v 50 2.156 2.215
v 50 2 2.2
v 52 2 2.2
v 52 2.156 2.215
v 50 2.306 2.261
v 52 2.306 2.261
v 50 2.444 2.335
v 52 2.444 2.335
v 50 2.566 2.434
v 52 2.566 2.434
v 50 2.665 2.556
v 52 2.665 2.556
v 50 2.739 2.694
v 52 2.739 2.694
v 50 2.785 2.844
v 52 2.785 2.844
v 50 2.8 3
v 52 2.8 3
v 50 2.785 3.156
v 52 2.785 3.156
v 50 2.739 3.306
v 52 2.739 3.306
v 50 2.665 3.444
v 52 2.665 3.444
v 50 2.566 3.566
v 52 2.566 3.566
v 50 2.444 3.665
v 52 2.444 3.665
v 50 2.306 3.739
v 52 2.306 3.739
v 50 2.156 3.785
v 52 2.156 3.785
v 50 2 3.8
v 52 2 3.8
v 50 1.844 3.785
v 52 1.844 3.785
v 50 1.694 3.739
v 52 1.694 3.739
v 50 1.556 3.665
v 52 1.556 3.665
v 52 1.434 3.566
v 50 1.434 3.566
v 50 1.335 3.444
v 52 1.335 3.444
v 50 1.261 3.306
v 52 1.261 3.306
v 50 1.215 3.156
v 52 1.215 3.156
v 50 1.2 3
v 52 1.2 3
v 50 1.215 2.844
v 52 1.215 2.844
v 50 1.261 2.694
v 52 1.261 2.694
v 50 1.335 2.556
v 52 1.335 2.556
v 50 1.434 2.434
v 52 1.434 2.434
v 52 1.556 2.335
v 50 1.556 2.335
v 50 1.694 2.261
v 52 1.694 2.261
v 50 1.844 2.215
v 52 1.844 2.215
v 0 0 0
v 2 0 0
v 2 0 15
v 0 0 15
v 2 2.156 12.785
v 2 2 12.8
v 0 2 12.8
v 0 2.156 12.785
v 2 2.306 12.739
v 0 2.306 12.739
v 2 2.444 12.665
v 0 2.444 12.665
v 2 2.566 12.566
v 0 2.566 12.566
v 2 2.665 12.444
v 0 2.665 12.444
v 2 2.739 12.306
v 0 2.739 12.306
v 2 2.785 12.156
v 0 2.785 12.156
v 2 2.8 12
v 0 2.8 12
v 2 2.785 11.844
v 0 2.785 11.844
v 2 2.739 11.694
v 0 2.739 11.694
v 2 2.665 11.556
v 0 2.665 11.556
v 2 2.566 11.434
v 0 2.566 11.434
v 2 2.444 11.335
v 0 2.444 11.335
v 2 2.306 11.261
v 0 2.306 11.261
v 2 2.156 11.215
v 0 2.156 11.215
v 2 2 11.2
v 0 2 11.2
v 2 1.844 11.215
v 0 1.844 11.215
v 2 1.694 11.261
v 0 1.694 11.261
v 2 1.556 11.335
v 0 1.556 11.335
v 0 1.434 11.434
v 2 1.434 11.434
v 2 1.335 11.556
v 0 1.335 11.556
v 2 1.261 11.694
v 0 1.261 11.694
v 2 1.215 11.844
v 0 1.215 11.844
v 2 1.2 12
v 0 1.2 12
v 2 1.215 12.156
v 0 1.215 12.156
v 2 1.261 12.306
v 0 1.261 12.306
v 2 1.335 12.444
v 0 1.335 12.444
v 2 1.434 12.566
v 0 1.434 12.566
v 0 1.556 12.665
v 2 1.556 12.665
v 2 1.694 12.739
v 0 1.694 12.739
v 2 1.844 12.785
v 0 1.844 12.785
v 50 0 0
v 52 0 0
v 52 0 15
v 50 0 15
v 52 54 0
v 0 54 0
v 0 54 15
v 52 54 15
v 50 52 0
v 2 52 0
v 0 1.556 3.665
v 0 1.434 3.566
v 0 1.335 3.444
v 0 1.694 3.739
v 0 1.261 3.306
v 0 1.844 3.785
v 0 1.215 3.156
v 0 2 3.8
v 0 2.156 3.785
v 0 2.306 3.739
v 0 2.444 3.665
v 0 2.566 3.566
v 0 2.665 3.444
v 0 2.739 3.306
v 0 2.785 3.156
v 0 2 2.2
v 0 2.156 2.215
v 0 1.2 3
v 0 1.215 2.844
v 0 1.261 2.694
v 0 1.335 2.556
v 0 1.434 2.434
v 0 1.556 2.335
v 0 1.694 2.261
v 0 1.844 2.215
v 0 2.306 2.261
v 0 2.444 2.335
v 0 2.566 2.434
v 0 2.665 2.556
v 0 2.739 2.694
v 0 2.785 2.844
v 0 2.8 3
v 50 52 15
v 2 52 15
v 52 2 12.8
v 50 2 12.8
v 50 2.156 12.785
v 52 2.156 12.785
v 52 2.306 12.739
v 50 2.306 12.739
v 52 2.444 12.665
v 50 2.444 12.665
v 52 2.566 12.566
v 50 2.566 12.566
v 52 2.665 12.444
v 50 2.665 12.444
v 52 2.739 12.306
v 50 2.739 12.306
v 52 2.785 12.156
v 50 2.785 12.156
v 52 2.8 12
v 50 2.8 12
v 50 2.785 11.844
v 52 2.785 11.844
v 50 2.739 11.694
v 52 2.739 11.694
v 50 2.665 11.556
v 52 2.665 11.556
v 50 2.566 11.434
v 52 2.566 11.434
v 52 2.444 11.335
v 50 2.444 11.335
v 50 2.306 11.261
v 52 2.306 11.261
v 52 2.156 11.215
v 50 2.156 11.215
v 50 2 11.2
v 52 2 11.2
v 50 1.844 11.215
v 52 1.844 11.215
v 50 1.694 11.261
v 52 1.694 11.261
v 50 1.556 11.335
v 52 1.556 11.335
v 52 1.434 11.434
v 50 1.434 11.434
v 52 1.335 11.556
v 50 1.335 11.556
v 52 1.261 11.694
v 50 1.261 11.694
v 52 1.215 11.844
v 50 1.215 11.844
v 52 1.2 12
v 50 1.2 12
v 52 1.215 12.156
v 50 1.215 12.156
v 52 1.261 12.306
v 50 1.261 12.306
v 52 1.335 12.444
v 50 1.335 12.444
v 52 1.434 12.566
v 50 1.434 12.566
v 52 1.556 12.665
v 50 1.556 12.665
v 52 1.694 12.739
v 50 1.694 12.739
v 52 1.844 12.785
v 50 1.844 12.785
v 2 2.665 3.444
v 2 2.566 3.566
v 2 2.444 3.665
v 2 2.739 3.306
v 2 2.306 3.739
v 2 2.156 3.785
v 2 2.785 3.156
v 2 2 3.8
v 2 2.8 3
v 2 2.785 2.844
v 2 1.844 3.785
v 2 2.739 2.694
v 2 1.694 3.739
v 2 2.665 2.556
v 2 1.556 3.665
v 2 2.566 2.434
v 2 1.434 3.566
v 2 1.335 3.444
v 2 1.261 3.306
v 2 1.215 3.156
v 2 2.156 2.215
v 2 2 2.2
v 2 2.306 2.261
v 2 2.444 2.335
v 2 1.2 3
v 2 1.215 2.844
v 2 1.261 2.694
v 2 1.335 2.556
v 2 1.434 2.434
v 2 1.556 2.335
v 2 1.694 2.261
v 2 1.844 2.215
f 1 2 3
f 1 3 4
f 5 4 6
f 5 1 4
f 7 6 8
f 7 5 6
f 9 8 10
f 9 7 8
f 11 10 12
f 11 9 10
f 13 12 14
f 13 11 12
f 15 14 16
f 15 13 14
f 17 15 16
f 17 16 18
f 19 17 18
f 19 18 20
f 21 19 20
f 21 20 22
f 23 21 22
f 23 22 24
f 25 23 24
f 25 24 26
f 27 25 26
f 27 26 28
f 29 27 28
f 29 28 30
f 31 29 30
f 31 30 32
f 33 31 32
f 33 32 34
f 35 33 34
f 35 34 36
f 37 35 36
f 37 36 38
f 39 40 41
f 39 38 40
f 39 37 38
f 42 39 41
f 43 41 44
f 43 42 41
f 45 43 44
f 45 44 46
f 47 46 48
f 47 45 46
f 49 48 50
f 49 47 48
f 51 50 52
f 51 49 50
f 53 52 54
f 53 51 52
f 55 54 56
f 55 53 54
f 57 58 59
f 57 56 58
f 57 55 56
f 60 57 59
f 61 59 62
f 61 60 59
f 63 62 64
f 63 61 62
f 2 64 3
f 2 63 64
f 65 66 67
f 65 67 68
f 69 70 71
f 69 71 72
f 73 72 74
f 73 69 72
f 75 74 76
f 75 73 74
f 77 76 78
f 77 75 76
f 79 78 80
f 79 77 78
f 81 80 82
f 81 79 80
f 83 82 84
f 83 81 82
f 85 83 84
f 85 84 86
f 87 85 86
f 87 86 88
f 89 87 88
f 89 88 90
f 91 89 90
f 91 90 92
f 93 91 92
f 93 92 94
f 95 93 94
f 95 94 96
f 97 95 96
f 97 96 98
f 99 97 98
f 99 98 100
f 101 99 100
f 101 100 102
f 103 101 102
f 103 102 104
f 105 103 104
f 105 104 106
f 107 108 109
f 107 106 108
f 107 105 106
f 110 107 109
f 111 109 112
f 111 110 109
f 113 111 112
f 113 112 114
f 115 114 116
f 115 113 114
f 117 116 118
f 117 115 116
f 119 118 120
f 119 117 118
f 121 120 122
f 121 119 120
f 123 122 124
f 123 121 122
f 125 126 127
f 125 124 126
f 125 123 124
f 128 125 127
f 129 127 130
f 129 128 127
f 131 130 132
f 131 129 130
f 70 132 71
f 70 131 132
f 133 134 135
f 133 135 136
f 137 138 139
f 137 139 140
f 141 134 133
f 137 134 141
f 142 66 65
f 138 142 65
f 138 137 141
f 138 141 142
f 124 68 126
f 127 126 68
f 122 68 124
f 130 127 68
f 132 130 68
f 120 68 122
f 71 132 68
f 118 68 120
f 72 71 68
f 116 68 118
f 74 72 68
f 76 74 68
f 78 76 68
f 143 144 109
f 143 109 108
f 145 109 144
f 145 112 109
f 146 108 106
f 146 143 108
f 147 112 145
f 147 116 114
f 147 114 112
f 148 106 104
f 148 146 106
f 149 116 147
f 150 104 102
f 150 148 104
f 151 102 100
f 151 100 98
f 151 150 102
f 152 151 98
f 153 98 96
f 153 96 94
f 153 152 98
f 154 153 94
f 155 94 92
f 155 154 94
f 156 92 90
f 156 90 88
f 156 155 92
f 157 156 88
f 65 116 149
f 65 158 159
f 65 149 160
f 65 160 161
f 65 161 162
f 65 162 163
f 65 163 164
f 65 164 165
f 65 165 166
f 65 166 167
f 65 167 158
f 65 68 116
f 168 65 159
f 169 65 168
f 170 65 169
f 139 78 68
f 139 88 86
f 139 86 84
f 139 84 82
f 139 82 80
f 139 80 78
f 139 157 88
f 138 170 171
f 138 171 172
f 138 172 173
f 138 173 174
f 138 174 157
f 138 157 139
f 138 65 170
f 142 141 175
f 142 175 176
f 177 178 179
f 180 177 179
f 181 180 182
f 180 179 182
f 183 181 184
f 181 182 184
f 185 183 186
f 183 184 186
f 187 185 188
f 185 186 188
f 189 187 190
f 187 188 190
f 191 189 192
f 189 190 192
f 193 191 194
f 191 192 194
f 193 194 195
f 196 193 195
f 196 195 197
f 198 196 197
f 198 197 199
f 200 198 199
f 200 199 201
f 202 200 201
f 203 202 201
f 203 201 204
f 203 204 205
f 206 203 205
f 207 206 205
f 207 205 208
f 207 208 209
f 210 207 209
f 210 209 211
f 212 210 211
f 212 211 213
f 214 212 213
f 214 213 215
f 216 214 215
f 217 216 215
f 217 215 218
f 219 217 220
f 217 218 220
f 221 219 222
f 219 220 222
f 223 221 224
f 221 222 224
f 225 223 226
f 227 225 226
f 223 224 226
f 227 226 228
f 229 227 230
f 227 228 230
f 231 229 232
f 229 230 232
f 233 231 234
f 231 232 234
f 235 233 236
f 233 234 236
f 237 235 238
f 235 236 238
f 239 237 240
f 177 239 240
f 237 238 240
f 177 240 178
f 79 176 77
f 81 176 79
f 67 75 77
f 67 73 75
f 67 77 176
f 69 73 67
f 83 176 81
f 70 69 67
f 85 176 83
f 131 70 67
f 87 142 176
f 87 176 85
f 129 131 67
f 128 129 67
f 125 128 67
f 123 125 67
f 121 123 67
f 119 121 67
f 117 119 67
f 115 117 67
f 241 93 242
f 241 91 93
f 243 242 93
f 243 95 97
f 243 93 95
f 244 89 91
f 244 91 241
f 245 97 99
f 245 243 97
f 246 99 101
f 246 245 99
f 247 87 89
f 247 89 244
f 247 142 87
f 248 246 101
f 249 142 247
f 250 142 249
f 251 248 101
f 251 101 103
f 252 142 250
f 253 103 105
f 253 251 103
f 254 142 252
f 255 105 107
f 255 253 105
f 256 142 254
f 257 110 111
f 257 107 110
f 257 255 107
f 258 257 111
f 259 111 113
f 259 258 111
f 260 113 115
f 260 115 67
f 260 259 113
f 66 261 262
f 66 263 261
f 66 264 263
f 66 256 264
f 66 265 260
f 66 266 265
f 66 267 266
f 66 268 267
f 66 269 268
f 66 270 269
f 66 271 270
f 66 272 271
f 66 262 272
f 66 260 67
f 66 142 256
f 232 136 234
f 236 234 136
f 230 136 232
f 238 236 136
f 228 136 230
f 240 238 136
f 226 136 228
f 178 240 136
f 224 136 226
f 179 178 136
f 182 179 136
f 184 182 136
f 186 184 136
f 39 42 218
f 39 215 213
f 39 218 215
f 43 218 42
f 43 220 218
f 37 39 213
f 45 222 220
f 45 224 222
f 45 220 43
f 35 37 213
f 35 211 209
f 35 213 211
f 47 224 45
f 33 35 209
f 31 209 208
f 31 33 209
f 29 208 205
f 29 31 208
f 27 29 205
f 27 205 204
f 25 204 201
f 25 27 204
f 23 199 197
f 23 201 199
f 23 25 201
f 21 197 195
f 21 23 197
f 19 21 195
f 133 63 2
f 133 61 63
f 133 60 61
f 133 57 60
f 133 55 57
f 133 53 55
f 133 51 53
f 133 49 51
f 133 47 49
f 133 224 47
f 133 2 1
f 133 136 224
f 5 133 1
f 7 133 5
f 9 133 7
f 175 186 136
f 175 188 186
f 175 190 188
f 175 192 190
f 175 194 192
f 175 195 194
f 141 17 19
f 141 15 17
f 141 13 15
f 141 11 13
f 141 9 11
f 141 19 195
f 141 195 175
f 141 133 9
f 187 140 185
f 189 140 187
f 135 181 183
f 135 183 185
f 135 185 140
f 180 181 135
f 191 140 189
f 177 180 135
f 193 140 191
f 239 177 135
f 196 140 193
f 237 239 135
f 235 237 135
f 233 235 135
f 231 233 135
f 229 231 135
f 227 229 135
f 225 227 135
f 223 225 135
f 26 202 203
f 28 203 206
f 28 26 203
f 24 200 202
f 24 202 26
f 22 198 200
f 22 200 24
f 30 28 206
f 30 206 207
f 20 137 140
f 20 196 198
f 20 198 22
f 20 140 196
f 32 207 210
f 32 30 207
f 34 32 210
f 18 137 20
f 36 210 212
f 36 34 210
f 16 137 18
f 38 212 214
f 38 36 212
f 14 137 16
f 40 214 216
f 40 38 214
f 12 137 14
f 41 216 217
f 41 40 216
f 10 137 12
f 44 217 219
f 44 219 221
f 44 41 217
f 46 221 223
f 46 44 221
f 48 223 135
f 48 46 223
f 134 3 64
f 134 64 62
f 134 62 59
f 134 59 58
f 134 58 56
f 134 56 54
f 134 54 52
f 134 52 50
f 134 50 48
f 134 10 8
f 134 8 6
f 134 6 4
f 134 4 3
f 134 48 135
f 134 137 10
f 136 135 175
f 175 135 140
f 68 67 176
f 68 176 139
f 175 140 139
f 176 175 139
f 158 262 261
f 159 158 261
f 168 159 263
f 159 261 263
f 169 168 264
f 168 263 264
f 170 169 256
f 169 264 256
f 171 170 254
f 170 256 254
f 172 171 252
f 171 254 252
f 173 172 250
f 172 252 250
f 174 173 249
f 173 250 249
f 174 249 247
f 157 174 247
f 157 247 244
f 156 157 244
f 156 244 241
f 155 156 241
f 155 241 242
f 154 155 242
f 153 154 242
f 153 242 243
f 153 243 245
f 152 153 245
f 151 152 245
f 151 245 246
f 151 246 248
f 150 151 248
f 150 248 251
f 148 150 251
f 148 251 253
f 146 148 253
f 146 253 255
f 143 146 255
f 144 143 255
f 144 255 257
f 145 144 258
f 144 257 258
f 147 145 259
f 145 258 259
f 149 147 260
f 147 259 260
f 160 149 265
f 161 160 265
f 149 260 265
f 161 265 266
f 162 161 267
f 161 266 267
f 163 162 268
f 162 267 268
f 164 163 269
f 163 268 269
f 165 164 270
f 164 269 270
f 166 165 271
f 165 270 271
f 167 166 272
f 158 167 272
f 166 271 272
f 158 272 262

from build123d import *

# Parameters (mm, degrees)
BOSS_EXTRUDE1_DEPTH   = 15
M2_TAPPED_HOLE1_D     = 1.6
M2_TAPPED_HOLE1_DEPTH = 49.999
MIRROR2_COPY_1_D      = 1.6
MIRROR2_COPY_1_DEPTH  = 49.999


with BuildPart() as part:
    # Sketch1 → Boss-Extrude1 (new body)
    with BuildSketch(Plane.XY):
        Polygon((0, 0), (0, 54), (52, 54), (52, 0), (50, 0), (50, 52), (2, 52), (2, 0), align=None)
    extrude(amount=BOSS_EXTRUDE1_DEPTH)

    # M2 Tapped Hole1
    with Locations(Plane(origin=(52, 0, 0), x_dir=(0, 0, -1), z_dir=(1, 0, 0))):
        with Locations((-12, 2)):
            m2_tapped_hole1 = Hole(M2_TAPPED_HOLE1_D / 2, depth=M2_TAPPED_HOLE1_DEPTH)

    # Mirror1: M2 Tapped Hole1 across plane
    add(m2_tapped_hole1.mirror(Plane.XY.offset(7.5)), mode=Mode.SUBTRACT)

    # Mirror2: M2 Tapped Hole1 across plane
    add(m2_tapped_hole1.mirror(Plane(origin=(26, 0, 0), x_dir=(0, 0, 1), z_dir=(1, 0, 0))), mode=Mode.SUBTRACT)

    # Mirror2 copy 1
    with Locations(Plane(origin=(0, 0, 15), x_dir=(0, 0, 1), z_dir=(-1, 0, 0))):
        with Locations((-12, 2)):
            Hole(MIRROR2_COPY_1_D / 2, depth=MIRROR2_COPY_1_DEPTH)


solid = part.part
